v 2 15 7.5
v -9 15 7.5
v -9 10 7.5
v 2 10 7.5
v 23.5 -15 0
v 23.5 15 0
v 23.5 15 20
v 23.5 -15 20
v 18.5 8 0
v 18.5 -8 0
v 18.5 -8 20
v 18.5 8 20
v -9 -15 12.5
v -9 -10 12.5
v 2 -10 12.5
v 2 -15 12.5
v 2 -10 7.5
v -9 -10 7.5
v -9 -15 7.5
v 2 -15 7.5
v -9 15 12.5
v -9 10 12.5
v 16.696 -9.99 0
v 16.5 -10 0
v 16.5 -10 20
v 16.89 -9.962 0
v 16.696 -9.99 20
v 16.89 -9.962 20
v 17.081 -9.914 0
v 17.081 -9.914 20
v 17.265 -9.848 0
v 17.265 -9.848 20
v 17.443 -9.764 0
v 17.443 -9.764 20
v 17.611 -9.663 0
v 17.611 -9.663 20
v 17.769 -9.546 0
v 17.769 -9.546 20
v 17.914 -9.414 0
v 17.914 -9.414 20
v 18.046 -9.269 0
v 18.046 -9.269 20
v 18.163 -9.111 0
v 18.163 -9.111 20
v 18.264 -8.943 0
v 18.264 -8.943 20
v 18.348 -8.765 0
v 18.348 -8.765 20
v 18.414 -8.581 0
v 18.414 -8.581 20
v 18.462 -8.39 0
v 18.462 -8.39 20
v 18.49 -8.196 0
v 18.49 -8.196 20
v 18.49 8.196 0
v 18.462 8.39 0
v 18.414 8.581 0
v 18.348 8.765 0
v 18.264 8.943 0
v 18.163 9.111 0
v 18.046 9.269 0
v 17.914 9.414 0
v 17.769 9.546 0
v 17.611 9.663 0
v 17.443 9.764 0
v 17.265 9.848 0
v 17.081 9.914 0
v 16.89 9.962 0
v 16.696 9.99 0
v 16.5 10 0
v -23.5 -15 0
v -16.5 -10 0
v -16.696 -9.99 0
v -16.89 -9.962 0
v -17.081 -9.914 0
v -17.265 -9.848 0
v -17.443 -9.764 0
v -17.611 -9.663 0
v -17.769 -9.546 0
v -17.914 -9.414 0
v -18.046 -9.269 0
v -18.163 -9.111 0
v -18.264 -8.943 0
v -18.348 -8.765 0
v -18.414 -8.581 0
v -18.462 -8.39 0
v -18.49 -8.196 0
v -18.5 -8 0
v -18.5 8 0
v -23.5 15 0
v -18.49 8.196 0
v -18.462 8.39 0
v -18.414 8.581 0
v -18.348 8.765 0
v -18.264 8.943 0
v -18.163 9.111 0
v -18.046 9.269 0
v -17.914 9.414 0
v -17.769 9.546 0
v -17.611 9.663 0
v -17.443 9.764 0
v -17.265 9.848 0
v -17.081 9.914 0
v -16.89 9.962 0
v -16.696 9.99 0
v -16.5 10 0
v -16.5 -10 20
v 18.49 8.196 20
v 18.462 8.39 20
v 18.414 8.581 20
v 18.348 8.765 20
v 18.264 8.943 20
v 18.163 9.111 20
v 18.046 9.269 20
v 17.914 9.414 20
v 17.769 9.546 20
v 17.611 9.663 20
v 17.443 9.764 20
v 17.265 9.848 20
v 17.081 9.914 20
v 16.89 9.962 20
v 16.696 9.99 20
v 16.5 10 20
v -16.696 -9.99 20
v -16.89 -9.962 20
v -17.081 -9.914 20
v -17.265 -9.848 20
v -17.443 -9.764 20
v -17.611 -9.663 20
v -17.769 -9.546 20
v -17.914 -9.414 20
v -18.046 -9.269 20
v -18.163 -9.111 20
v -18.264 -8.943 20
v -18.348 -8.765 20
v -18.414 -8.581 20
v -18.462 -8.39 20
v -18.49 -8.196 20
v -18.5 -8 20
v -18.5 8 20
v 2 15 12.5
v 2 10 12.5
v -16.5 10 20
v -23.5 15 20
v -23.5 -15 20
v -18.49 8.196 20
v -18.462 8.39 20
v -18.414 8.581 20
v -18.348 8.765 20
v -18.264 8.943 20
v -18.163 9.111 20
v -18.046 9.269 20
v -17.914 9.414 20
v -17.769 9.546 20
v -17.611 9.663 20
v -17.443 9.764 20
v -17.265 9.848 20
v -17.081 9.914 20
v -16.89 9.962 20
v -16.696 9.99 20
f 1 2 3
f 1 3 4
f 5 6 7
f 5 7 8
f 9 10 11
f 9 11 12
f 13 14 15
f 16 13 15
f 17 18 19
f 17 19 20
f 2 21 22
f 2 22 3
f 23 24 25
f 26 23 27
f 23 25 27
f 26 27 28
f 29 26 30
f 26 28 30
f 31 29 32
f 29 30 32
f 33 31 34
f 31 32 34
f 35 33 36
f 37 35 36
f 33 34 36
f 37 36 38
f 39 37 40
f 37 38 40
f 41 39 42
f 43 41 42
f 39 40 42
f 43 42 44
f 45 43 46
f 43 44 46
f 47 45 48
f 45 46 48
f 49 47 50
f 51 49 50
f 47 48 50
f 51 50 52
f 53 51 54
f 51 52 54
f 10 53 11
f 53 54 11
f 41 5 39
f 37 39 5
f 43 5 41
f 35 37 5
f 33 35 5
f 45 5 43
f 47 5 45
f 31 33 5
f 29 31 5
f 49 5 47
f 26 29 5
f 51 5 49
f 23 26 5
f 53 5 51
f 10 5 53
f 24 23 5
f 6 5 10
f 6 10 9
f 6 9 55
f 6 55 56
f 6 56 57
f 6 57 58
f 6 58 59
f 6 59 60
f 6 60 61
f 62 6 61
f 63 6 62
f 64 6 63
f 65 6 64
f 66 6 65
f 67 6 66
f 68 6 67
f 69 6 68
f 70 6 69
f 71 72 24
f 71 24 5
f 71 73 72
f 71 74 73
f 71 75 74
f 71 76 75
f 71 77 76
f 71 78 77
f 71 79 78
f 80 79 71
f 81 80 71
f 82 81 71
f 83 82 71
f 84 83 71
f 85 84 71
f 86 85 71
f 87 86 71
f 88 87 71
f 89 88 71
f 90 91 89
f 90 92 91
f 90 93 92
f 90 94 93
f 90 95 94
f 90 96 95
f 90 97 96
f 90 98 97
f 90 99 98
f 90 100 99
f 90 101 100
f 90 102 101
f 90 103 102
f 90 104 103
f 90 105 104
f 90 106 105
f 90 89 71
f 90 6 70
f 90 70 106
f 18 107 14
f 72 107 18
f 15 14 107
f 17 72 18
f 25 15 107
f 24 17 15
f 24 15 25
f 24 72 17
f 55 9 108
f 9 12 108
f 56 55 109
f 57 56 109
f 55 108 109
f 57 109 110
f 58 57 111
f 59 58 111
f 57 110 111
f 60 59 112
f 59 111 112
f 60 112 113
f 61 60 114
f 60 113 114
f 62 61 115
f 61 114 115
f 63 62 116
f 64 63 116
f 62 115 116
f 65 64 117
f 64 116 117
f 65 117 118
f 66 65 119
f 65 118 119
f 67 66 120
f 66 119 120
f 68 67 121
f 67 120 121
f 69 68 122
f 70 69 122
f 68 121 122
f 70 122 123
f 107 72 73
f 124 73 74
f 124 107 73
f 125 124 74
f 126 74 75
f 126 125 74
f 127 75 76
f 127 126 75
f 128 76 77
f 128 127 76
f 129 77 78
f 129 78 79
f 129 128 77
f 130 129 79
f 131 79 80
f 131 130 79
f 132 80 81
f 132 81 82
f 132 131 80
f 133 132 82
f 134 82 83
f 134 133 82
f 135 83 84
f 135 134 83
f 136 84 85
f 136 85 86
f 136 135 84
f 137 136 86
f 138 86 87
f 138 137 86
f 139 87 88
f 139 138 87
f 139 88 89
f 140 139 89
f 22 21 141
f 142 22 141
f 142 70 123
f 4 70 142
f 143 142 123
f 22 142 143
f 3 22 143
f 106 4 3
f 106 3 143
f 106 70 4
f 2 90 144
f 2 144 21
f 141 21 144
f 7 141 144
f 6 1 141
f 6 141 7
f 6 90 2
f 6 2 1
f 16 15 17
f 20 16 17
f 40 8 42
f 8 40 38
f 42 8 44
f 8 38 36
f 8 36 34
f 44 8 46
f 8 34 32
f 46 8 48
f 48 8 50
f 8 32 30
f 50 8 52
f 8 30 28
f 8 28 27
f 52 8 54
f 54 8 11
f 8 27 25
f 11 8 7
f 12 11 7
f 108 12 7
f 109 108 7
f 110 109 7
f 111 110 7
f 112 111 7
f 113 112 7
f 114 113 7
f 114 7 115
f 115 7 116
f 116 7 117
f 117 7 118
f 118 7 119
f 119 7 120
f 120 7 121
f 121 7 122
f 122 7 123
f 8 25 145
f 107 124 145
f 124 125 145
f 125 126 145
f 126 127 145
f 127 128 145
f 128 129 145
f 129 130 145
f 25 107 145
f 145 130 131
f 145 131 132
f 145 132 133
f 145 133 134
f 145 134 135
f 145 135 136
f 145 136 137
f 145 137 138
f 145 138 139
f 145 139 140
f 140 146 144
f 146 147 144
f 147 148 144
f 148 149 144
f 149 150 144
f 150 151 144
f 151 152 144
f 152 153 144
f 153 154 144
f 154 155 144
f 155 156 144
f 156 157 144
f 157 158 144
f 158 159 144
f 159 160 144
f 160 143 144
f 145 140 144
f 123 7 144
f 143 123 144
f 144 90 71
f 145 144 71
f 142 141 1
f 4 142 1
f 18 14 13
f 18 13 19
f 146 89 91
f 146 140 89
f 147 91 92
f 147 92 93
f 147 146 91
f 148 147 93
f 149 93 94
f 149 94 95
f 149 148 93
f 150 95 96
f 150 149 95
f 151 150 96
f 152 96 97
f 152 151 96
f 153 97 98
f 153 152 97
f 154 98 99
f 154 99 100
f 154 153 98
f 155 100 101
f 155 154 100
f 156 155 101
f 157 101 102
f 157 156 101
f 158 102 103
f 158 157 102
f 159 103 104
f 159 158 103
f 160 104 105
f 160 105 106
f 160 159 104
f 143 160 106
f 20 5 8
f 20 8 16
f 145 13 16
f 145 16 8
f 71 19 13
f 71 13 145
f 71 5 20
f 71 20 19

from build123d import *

# Parameters (mm, degrees)
EXTRUDE_1_DEPTH     = 20
FILLET_1_R          = 2
SKETCH_3_W          = 11
SKETCH_3_H          = 5
CUT_EXTRUDE_3_DEPTH = 31


with BuildPart() as part:
    # Sketch 1 → Extrude 1 (new body)
    with BuildSketch(Plane.XY):
        Polygon((0, 15), (-23.5, 15), (-23.5, -15), (0, -15), (0, -10), (-18.5, -10), (-18.5, 10), (0, 10), align=None)
    extrude(amount=EXTRUDE_1_DEPTH)

    # Fillet 1
    fillet_1_edges = [part.edges().sort_by_distance(p)[0] for p in [
        (-18.5, -10, 10),
        (-18.5, 10, 10),
    ]]
    fillet(fillet_1_edges, radius=FILLET_1_R)

    # Mirror 1: part across plane


with BuildPart() as part_1:
    add(part.part)
    add(part.part.mirror(Plane(origin=(0, 0, 20), x_dir=(0, 0, 1), z_dir=(1, 0, 0))))

    # Sketch 3 → Cut-Extrude 3 (cut, through all)
    with BuildSketch(Plane(origin=(0, 15, 0), x_dir=(1, 0, 0), z_dir=(0, 1, 0))):
        with Locations((-3.5, -10)):
            Rectangle(SKETCH_3_W, SKETCH_3_H)
    extrude(amount=-CUT_EXTRUDE_3_DEPTH, mode=Mode.SUBTRACT)


solid = part_1.part
